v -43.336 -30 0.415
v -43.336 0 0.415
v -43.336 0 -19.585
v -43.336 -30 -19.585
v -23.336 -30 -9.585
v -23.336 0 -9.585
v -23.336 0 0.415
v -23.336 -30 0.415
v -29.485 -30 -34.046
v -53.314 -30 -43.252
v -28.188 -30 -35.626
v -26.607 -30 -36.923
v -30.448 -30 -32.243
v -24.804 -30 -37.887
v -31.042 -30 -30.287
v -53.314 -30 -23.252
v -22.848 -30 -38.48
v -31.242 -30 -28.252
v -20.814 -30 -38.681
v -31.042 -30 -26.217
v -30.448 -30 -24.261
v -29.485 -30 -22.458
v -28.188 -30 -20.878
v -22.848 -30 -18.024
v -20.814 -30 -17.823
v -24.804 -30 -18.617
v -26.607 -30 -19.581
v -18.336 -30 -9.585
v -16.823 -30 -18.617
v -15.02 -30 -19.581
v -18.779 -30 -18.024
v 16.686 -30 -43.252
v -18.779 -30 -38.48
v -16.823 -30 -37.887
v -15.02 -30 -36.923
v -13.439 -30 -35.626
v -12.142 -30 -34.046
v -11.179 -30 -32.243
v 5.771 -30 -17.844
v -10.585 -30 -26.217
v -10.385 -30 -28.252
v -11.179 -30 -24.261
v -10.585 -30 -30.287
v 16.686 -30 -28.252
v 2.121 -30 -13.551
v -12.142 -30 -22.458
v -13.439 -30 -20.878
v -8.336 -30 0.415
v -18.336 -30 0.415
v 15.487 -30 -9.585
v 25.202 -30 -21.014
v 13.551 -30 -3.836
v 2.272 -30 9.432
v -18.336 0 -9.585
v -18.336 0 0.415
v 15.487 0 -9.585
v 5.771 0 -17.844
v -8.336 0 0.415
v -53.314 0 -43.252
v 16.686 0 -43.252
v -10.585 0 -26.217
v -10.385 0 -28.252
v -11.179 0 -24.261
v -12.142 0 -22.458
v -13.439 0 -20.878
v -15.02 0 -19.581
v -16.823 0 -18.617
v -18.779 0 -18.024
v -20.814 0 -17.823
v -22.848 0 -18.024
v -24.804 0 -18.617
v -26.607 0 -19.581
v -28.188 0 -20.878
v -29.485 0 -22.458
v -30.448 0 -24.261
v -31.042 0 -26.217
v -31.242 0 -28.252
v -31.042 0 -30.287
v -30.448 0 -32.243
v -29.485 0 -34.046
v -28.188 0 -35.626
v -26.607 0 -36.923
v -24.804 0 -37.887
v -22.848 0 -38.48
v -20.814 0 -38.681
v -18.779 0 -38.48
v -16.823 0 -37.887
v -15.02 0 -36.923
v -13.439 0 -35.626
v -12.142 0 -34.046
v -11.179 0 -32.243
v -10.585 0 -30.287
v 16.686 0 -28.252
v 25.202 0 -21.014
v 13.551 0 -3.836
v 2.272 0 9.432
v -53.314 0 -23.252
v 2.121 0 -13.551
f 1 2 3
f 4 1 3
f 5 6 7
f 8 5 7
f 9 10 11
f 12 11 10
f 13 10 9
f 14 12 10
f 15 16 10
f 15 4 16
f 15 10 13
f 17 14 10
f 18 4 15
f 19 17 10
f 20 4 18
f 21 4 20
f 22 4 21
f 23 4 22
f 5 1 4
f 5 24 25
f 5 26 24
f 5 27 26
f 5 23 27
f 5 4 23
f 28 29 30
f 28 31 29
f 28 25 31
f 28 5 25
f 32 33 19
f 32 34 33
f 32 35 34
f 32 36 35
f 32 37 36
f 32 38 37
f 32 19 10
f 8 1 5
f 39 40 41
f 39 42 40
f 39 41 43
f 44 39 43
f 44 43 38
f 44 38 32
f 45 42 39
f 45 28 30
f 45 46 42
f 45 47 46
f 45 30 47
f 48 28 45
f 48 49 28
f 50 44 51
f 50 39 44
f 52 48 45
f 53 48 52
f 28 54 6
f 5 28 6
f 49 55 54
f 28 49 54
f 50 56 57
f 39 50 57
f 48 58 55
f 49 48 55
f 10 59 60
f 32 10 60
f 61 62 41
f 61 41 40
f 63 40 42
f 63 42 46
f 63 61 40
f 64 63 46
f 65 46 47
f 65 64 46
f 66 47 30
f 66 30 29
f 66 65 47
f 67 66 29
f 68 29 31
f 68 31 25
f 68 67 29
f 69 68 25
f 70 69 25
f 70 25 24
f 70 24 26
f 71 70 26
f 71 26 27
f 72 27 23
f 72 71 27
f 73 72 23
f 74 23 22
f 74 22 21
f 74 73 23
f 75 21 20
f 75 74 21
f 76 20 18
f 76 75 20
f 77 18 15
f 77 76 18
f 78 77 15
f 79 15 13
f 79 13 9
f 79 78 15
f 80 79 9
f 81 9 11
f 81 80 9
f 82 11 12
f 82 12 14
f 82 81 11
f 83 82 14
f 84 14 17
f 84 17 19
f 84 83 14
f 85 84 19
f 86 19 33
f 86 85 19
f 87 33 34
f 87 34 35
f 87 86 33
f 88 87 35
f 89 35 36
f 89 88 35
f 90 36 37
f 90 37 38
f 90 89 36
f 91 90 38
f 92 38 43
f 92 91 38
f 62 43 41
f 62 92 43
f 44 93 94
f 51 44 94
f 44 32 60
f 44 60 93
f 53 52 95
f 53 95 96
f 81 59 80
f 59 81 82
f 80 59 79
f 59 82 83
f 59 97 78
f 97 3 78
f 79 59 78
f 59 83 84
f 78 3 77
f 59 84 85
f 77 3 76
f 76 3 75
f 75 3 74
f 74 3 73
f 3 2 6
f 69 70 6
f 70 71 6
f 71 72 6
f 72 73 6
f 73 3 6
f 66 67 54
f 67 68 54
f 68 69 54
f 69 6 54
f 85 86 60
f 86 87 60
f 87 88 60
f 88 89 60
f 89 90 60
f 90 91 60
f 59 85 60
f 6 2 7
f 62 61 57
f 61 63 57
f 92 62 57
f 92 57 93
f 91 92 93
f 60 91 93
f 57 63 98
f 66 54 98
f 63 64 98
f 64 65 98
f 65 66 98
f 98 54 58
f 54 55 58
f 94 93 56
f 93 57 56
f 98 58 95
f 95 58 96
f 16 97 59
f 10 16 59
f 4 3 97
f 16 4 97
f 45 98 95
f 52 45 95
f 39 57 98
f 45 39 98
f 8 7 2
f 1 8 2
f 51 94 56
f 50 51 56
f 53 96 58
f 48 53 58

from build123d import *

# Parameters (mm, degrees)
F0_R     = 10.428739
F1_DEPTH = 30


with BuildPart() as f1:
    # F0 (on Front) → F1 (new body)
    with BuildSketch(Plane.XZ):
        Polygon((-53.313535, -23.252012), (-53.313535, -43.252012), (16.686465, -43.252012), (16.686465, -28.252012), (25.202147, -21.013682), (15.48742, -9.584593), (5.770595, -17.843895), (2.121453, -13.550788), (13.550542, -3.83606), (2.27239, 9.432352), (-8.335778, 0.415407), (-18.335778, 0.415407), (-18.335778, -9.584593), (-23.335778, -9.584593), (-23.335778, 0.415407), (-43.335778, 0.415407), (-43.335778, -19.584593), align=None)
        with Locations((-20.813535, -28.252012)):
            Circle(F0_R, mode=Mode.SUBTRACT)
    extrude(amount=F1_DEPTH)


solid = f1.part
